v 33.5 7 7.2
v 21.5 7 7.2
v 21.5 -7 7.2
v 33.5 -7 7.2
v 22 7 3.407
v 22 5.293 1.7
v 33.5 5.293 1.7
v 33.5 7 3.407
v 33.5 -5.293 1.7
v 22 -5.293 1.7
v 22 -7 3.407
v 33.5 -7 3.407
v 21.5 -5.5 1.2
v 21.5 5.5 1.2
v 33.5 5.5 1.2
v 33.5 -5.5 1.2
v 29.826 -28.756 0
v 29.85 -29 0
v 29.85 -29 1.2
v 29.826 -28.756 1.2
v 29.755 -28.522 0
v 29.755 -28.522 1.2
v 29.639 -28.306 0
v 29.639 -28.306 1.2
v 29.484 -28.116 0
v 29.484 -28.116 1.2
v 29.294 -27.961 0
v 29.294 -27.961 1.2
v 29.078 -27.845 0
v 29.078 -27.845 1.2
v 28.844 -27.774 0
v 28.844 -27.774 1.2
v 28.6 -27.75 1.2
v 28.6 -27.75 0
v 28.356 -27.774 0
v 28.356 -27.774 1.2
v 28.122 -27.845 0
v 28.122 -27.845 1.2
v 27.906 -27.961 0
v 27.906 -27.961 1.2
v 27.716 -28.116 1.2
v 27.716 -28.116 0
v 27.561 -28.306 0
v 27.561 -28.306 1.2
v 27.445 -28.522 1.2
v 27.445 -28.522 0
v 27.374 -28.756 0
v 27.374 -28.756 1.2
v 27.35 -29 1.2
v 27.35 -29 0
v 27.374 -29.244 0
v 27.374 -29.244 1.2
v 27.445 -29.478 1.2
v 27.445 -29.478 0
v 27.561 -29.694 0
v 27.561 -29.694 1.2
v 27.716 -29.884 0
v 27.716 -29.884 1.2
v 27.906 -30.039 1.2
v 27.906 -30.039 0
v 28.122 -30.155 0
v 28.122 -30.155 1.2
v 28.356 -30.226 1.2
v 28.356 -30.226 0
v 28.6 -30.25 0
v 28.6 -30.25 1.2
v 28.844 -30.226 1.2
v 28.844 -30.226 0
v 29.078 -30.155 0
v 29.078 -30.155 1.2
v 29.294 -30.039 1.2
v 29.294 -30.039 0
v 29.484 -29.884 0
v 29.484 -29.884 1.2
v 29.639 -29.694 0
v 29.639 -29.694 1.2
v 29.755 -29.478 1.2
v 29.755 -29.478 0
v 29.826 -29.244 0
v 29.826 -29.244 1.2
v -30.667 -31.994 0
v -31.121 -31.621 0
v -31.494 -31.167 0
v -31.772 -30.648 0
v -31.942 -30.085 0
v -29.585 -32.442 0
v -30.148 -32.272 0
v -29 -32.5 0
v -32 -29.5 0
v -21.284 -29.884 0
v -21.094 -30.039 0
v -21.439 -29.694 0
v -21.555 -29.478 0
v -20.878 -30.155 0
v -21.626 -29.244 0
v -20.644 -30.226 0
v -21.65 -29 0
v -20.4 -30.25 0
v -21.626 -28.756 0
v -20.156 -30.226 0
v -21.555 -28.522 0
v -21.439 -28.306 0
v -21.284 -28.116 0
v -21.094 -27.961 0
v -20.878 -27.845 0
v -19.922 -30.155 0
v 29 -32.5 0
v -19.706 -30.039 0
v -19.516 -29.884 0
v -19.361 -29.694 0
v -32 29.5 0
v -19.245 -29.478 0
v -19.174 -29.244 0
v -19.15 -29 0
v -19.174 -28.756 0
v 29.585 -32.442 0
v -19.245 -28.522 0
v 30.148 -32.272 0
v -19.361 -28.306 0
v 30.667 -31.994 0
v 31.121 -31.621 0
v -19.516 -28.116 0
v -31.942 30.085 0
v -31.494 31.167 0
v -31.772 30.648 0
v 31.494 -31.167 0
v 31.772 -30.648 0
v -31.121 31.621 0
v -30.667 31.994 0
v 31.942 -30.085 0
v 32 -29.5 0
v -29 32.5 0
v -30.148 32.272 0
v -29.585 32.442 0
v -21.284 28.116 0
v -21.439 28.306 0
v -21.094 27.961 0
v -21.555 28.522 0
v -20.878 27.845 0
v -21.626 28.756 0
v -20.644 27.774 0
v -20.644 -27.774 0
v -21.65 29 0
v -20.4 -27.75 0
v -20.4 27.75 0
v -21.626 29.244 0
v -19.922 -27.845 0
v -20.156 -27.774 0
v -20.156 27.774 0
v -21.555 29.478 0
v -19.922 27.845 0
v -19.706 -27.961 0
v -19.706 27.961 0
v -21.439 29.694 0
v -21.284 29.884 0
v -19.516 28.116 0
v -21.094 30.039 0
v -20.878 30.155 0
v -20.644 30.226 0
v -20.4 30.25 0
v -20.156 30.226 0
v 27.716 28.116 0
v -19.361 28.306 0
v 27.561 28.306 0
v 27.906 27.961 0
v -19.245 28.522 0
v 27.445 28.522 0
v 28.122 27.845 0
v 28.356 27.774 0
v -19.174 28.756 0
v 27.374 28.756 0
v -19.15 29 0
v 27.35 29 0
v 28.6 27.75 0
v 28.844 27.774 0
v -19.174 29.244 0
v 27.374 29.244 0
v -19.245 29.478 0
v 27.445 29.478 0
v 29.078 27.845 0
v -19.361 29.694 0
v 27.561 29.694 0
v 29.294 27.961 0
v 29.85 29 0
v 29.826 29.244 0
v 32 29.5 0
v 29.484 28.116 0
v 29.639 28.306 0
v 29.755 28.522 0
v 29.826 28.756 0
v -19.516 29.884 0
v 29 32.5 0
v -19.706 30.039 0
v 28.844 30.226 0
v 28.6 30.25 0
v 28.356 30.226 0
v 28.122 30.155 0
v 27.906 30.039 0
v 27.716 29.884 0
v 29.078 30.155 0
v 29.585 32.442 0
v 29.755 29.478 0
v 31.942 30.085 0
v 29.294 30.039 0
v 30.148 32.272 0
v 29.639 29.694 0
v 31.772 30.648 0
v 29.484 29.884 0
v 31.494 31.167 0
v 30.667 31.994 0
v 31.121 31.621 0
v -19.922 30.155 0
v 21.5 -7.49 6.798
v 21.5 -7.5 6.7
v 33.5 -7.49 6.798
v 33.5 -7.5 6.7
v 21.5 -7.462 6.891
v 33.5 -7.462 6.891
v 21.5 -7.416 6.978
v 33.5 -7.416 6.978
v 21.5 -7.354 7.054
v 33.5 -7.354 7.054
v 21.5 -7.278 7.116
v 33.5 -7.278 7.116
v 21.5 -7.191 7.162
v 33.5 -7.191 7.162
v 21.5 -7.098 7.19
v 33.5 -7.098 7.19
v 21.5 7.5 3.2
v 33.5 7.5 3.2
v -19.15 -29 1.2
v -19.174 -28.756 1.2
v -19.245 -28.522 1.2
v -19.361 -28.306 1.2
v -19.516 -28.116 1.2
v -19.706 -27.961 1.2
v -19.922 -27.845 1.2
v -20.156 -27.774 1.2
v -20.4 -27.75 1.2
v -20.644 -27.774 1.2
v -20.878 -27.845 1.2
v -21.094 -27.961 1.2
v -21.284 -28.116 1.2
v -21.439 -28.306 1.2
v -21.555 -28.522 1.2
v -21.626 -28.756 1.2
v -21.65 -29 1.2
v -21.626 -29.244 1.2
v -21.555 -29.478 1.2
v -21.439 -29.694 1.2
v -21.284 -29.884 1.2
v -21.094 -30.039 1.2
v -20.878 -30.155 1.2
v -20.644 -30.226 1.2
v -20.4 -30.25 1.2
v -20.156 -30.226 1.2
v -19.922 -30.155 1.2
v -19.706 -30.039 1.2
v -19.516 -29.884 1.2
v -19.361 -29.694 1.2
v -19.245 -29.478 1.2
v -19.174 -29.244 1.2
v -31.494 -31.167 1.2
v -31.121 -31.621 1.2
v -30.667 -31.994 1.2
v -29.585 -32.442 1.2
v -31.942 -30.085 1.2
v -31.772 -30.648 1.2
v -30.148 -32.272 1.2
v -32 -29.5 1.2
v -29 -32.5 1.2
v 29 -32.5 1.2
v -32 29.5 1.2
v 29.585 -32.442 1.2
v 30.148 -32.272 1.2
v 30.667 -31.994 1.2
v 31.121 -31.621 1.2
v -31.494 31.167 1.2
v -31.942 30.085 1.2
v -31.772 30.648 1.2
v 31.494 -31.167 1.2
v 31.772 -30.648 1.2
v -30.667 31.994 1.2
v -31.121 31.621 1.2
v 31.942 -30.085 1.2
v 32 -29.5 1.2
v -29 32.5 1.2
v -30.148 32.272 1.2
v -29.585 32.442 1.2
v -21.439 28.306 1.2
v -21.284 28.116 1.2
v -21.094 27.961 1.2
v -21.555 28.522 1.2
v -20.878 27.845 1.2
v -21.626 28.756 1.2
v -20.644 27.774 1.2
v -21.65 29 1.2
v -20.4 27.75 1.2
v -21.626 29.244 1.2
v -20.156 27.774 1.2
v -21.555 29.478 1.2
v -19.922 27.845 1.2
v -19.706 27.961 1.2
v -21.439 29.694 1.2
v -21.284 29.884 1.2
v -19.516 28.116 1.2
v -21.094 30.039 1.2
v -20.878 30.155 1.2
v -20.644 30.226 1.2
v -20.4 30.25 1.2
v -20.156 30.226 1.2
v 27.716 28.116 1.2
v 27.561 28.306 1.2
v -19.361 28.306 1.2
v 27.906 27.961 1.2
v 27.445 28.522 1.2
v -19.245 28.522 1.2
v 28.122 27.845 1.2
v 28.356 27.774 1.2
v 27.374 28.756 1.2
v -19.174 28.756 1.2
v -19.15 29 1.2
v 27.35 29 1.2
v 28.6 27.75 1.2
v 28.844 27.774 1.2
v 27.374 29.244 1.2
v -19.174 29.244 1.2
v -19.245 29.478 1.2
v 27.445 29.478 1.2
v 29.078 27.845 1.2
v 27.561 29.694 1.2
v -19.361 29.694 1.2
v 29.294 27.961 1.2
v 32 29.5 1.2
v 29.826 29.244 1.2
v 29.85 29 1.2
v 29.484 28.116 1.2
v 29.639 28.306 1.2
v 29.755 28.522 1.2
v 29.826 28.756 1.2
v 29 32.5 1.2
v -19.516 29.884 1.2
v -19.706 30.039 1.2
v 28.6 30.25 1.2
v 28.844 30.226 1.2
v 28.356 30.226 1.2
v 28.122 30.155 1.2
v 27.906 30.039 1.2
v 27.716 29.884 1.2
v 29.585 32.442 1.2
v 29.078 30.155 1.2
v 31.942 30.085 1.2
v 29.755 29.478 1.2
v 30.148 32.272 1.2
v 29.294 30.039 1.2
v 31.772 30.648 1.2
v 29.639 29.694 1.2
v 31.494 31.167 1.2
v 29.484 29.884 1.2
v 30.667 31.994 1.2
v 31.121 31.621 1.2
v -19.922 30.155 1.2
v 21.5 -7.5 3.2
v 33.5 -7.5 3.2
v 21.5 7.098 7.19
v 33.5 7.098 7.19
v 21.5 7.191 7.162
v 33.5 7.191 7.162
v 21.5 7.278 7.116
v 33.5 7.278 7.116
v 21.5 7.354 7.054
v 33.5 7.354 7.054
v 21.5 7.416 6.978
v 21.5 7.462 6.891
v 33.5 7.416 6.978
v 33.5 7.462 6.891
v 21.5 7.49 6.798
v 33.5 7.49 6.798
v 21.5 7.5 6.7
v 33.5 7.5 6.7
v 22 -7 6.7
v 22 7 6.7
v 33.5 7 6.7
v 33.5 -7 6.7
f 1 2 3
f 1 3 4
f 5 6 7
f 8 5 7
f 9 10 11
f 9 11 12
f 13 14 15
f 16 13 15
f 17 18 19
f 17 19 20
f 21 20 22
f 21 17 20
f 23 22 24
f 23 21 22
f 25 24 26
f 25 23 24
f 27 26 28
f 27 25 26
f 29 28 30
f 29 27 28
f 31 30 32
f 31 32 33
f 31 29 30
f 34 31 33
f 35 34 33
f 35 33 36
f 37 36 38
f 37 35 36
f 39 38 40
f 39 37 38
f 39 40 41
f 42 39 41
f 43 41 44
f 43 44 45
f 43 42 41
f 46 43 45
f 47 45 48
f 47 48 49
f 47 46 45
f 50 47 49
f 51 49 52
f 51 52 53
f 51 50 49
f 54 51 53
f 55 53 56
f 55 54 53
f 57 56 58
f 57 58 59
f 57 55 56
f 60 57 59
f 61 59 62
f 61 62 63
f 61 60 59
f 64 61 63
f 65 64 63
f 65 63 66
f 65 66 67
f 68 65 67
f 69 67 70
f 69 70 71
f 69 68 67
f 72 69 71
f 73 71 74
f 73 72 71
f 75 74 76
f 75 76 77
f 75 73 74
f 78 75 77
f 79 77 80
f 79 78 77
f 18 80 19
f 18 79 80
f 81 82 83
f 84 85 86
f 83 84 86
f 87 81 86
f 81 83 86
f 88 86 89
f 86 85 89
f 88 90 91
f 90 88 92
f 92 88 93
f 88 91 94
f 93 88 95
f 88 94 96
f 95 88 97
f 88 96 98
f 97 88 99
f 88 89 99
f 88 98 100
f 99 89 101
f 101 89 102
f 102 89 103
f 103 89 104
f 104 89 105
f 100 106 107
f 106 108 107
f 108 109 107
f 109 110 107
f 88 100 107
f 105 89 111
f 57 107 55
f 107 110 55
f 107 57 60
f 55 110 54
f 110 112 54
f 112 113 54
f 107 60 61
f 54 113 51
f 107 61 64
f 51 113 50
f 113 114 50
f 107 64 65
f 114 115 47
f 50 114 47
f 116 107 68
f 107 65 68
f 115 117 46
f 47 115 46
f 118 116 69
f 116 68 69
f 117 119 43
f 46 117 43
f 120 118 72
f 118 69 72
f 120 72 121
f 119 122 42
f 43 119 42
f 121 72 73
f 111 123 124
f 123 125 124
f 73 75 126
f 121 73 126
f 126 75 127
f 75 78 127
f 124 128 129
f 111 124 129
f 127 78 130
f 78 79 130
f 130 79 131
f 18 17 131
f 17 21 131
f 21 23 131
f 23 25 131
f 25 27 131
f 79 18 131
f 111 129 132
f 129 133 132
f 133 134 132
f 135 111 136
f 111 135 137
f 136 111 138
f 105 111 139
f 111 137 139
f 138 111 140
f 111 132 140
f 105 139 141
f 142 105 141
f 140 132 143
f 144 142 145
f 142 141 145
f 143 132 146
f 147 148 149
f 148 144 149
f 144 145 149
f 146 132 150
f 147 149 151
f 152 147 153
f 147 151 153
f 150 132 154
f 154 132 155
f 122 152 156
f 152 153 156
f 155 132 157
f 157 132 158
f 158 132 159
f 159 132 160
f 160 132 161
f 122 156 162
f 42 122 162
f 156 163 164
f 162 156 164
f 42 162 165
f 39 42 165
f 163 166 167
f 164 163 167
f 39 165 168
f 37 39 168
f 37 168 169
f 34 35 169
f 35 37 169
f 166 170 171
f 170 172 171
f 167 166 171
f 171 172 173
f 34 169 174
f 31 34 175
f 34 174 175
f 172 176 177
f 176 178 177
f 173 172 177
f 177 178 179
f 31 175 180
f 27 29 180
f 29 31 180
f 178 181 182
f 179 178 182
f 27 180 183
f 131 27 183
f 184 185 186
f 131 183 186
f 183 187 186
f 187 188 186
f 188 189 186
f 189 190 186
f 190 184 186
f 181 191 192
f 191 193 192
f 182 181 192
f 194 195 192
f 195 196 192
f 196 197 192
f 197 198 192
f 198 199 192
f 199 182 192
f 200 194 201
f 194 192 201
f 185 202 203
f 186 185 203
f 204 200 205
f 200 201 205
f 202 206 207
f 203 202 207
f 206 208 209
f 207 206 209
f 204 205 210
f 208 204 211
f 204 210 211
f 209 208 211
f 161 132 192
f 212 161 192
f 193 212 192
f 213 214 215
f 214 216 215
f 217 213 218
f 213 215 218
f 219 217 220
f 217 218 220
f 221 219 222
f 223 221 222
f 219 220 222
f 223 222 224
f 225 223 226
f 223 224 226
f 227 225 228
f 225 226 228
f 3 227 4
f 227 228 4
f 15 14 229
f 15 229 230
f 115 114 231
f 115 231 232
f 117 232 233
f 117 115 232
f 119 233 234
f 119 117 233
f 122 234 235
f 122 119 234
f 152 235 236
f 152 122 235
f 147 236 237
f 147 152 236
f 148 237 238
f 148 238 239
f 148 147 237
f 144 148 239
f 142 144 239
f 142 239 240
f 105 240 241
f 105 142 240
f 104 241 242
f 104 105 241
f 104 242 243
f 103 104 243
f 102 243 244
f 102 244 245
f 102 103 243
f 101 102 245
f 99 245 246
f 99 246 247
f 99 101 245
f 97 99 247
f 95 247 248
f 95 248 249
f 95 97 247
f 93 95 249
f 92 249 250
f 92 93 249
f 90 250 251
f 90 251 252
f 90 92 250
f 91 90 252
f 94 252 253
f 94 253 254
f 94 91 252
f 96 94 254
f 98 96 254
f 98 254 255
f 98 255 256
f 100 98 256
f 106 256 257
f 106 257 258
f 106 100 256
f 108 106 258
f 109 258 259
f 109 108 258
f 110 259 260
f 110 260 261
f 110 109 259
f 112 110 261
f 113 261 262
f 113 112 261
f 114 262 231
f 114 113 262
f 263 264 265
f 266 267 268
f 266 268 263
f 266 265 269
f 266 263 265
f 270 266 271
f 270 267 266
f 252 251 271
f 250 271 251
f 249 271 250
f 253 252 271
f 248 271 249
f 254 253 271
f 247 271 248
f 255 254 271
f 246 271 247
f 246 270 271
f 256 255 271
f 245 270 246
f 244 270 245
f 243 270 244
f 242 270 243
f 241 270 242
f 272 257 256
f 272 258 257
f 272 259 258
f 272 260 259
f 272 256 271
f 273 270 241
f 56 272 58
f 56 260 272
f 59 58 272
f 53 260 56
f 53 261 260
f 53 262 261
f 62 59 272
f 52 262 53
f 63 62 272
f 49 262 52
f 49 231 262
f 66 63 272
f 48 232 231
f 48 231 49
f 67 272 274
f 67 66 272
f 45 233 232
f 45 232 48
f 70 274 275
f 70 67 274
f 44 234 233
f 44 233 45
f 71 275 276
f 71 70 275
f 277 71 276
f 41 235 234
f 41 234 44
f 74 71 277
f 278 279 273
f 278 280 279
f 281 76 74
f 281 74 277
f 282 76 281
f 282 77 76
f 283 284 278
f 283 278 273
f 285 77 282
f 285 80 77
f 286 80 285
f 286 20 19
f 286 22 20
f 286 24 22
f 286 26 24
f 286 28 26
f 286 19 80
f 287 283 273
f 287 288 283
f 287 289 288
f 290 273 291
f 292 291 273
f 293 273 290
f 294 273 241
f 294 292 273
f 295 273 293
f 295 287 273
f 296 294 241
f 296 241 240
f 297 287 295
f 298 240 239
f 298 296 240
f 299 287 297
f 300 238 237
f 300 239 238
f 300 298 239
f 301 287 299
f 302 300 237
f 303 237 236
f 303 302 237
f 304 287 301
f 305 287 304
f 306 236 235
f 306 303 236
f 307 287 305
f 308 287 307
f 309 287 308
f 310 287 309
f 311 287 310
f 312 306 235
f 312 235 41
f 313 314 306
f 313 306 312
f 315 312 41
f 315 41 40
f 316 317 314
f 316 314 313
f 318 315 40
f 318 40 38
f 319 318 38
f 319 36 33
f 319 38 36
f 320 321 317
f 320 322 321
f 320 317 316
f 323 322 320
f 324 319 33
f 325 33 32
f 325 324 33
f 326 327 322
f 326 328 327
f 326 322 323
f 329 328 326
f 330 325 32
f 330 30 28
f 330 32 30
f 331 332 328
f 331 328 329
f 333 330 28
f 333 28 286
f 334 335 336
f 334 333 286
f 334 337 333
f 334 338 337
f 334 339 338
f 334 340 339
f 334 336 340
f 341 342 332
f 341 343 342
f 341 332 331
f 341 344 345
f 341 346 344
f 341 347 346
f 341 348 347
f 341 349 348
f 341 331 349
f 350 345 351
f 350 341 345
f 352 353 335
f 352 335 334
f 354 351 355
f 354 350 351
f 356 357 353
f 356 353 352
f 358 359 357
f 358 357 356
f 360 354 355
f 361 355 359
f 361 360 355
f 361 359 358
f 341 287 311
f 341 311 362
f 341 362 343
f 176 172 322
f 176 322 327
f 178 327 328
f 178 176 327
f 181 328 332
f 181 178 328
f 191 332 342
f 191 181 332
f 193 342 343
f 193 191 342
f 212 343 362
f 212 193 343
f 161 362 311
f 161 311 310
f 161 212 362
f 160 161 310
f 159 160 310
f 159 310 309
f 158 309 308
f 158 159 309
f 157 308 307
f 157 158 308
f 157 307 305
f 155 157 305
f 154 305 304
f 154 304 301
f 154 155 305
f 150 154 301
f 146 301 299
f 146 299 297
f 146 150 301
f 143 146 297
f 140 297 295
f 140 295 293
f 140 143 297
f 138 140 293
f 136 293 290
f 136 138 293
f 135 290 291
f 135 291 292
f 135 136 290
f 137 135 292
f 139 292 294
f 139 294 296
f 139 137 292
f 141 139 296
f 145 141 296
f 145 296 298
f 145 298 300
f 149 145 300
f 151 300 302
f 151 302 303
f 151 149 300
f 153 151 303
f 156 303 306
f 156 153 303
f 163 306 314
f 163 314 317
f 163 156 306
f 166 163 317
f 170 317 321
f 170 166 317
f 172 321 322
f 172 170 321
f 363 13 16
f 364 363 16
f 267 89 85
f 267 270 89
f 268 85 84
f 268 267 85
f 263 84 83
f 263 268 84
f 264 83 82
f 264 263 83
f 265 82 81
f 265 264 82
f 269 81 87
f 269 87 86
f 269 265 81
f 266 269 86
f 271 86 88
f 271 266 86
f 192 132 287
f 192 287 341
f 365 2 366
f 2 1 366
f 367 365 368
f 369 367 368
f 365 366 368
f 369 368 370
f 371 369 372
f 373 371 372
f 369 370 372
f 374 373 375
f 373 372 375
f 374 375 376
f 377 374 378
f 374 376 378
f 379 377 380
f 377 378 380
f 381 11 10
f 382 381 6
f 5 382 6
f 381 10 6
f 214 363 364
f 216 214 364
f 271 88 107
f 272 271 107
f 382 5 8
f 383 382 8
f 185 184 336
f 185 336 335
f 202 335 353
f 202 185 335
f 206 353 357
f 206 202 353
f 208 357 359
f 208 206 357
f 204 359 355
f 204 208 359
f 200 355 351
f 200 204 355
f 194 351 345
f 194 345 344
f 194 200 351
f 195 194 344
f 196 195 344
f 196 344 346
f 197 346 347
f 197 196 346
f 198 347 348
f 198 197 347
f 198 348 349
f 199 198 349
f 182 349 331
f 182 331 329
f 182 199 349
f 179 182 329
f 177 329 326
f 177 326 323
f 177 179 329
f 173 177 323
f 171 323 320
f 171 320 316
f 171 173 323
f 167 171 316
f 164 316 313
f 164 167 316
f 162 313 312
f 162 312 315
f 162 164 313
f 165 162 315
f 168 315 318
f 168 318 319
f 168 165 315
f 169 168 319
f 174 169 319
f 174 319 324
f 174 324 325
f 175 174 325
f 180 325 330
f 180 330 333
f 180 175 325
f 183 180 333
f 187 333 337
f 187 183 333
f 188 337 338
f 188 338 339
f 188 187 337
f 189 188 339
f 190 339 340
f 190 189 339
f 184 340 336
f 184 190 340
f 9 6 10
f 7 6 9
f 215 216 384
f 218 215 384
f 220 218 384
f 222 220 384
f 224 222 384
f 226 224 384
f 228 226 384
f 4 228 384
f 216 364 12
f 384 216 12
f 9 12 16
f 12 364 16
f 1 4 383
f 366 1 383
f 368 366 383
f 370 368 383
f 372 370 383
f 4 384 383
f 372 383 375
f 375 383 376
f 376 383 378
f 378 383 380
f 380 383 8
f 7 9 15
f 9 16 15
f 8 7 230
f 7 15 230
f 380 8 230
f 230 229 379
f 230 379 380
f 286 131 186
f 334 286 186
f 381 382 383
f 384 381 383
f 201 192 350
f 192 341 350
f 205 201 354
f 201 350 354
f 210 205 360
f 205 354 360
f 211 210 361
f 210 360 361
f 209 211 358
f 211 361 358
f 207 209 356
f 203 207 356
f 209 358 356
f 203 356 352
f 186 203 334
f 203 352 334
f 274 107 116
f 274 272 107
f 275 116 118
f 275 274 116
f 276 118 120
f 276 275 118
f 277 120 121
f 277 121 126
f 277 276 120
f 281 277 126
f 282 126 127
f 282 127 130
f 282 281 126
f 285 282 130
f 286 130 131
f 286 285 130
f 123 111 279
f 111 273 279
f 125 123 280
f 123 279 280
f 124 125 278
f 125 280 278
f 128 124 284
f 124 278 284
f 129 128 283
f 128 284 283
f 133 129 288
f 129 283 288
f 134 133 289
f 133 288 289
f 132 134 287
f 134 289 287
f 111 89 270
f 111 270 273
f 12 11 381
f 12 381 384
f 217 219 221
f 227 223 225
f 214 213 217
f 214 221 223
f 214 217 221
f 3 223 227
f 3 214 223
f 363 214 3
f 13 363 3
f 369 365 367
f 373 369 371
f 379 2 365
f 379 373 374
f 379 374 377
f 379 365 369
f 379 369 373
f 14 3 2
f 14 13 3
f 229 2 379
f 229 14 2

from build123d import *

# Parameters (mm, degrees)
F0_W     = 64
F0_H     = 65
F0_R     = 1.25
F1_DEPTH = 1.2
F2_R     = 3
F3_W     = 12
F3_H     = 15
F4_DEPTH = 6
F5_SIZE  = 2
F6_R     = 0.5
F7_T     = 0.5


# Not quite as in the source:
# - a shell that OpenCascade refuses in one call is made with other operations: the cavity is built on its own and cut out


with BuildPart() as f1:
    # F0 (on Top) → F1 (new body)
    with BuildSketch(Plane.XY):
        Rectangle(F0_W, F0_H)
        with Locations((-20.4, -29)):
            Circle(F0_R, mode=Mode.SUBTRACT)
        with Locations((28.6, -29)):
            Circle(F0_R, mode=Mode.SUBTRACT)
        with Locations((-20.4, 29)):
            Circle(F0_R, mode=Mode.SUBTRACT)
        with Locations((28.6, 29)):
            Circle(F0_R, mode=Mode.SUBTRACT)
    extrude(amount=F1_DEPTH)

    # F2
    f2_edges = [f1.edges().sort_by_distance(p)[0] for p in [
        (-32, 32.5, 0.6),
        (32, 32.5, 0.6),
        (32, -32.5, 0.6),
        (-32, -32.5, 0.6),
    ]]
    fillet(f2_edges, radius=F2_R)


with BuildPart() as f4:
    # F3 (on face) → F4 (new body)
    with BuildSketch(Plane.XY.offset(1.2)):
        with Locations((27.5, 0)):
            Rectangle(F3_W, F3_H)
    extrude(amount=F4_DEPTH)

    # F5
    f5_edges = [f4.edges().sort_by_distance(p)[0] for p in [
        (27.5, -7.5, 1.2),
        (27.5, 7.5, 1.2),
    ]]
    chamfer(f5_edges, length=F5_SIZE)

    # F6
    f6_edges = [f4.edges().sort_by_distance(p)[0] for p in [
        (27.5, -7.5, 7.2),
        (27.5, 7.5, 7.2),
    ]]
    fillet(f6_edges, radius=F6_R)

    # F7: shell of thickness 0.5, made by hand


with BuildPart() as f7_core1:
    # F7_t2: copy of F4
    add(f4.part)

    # the walls: a layer under each face that stays
    f7_faces = [f7_core1.faces().sort_by_distance(p)[0] for p in [
        (27.5, -7.5, 4.95),
        (27.5, -6.5, 2.2),
        (27.5, 0, 7.2),
        (27.5, 0, 1.2),
        (27.5, 6.5, 2.2),
        (27.5, 7.5, 4.95),
        (21.5, 0, 4.2),
    ]]
    thicken(f7_faces, amount=-F7_T, mode=Mode.SUBTRACT)


with BuildPart() as f4_1:
    add(f4.part)

    # what is left inside the walls is the cavity
    f7_cavity = [f7_core1.part.solids().sort_by_distance(p)[0] for p in [
        (27.75, -2.333333, 6.695),
    ]]
    add(f7_cavity, mode=Mode.SUBTRACT)


solid = Compound([f1.part, f4_1.part])
